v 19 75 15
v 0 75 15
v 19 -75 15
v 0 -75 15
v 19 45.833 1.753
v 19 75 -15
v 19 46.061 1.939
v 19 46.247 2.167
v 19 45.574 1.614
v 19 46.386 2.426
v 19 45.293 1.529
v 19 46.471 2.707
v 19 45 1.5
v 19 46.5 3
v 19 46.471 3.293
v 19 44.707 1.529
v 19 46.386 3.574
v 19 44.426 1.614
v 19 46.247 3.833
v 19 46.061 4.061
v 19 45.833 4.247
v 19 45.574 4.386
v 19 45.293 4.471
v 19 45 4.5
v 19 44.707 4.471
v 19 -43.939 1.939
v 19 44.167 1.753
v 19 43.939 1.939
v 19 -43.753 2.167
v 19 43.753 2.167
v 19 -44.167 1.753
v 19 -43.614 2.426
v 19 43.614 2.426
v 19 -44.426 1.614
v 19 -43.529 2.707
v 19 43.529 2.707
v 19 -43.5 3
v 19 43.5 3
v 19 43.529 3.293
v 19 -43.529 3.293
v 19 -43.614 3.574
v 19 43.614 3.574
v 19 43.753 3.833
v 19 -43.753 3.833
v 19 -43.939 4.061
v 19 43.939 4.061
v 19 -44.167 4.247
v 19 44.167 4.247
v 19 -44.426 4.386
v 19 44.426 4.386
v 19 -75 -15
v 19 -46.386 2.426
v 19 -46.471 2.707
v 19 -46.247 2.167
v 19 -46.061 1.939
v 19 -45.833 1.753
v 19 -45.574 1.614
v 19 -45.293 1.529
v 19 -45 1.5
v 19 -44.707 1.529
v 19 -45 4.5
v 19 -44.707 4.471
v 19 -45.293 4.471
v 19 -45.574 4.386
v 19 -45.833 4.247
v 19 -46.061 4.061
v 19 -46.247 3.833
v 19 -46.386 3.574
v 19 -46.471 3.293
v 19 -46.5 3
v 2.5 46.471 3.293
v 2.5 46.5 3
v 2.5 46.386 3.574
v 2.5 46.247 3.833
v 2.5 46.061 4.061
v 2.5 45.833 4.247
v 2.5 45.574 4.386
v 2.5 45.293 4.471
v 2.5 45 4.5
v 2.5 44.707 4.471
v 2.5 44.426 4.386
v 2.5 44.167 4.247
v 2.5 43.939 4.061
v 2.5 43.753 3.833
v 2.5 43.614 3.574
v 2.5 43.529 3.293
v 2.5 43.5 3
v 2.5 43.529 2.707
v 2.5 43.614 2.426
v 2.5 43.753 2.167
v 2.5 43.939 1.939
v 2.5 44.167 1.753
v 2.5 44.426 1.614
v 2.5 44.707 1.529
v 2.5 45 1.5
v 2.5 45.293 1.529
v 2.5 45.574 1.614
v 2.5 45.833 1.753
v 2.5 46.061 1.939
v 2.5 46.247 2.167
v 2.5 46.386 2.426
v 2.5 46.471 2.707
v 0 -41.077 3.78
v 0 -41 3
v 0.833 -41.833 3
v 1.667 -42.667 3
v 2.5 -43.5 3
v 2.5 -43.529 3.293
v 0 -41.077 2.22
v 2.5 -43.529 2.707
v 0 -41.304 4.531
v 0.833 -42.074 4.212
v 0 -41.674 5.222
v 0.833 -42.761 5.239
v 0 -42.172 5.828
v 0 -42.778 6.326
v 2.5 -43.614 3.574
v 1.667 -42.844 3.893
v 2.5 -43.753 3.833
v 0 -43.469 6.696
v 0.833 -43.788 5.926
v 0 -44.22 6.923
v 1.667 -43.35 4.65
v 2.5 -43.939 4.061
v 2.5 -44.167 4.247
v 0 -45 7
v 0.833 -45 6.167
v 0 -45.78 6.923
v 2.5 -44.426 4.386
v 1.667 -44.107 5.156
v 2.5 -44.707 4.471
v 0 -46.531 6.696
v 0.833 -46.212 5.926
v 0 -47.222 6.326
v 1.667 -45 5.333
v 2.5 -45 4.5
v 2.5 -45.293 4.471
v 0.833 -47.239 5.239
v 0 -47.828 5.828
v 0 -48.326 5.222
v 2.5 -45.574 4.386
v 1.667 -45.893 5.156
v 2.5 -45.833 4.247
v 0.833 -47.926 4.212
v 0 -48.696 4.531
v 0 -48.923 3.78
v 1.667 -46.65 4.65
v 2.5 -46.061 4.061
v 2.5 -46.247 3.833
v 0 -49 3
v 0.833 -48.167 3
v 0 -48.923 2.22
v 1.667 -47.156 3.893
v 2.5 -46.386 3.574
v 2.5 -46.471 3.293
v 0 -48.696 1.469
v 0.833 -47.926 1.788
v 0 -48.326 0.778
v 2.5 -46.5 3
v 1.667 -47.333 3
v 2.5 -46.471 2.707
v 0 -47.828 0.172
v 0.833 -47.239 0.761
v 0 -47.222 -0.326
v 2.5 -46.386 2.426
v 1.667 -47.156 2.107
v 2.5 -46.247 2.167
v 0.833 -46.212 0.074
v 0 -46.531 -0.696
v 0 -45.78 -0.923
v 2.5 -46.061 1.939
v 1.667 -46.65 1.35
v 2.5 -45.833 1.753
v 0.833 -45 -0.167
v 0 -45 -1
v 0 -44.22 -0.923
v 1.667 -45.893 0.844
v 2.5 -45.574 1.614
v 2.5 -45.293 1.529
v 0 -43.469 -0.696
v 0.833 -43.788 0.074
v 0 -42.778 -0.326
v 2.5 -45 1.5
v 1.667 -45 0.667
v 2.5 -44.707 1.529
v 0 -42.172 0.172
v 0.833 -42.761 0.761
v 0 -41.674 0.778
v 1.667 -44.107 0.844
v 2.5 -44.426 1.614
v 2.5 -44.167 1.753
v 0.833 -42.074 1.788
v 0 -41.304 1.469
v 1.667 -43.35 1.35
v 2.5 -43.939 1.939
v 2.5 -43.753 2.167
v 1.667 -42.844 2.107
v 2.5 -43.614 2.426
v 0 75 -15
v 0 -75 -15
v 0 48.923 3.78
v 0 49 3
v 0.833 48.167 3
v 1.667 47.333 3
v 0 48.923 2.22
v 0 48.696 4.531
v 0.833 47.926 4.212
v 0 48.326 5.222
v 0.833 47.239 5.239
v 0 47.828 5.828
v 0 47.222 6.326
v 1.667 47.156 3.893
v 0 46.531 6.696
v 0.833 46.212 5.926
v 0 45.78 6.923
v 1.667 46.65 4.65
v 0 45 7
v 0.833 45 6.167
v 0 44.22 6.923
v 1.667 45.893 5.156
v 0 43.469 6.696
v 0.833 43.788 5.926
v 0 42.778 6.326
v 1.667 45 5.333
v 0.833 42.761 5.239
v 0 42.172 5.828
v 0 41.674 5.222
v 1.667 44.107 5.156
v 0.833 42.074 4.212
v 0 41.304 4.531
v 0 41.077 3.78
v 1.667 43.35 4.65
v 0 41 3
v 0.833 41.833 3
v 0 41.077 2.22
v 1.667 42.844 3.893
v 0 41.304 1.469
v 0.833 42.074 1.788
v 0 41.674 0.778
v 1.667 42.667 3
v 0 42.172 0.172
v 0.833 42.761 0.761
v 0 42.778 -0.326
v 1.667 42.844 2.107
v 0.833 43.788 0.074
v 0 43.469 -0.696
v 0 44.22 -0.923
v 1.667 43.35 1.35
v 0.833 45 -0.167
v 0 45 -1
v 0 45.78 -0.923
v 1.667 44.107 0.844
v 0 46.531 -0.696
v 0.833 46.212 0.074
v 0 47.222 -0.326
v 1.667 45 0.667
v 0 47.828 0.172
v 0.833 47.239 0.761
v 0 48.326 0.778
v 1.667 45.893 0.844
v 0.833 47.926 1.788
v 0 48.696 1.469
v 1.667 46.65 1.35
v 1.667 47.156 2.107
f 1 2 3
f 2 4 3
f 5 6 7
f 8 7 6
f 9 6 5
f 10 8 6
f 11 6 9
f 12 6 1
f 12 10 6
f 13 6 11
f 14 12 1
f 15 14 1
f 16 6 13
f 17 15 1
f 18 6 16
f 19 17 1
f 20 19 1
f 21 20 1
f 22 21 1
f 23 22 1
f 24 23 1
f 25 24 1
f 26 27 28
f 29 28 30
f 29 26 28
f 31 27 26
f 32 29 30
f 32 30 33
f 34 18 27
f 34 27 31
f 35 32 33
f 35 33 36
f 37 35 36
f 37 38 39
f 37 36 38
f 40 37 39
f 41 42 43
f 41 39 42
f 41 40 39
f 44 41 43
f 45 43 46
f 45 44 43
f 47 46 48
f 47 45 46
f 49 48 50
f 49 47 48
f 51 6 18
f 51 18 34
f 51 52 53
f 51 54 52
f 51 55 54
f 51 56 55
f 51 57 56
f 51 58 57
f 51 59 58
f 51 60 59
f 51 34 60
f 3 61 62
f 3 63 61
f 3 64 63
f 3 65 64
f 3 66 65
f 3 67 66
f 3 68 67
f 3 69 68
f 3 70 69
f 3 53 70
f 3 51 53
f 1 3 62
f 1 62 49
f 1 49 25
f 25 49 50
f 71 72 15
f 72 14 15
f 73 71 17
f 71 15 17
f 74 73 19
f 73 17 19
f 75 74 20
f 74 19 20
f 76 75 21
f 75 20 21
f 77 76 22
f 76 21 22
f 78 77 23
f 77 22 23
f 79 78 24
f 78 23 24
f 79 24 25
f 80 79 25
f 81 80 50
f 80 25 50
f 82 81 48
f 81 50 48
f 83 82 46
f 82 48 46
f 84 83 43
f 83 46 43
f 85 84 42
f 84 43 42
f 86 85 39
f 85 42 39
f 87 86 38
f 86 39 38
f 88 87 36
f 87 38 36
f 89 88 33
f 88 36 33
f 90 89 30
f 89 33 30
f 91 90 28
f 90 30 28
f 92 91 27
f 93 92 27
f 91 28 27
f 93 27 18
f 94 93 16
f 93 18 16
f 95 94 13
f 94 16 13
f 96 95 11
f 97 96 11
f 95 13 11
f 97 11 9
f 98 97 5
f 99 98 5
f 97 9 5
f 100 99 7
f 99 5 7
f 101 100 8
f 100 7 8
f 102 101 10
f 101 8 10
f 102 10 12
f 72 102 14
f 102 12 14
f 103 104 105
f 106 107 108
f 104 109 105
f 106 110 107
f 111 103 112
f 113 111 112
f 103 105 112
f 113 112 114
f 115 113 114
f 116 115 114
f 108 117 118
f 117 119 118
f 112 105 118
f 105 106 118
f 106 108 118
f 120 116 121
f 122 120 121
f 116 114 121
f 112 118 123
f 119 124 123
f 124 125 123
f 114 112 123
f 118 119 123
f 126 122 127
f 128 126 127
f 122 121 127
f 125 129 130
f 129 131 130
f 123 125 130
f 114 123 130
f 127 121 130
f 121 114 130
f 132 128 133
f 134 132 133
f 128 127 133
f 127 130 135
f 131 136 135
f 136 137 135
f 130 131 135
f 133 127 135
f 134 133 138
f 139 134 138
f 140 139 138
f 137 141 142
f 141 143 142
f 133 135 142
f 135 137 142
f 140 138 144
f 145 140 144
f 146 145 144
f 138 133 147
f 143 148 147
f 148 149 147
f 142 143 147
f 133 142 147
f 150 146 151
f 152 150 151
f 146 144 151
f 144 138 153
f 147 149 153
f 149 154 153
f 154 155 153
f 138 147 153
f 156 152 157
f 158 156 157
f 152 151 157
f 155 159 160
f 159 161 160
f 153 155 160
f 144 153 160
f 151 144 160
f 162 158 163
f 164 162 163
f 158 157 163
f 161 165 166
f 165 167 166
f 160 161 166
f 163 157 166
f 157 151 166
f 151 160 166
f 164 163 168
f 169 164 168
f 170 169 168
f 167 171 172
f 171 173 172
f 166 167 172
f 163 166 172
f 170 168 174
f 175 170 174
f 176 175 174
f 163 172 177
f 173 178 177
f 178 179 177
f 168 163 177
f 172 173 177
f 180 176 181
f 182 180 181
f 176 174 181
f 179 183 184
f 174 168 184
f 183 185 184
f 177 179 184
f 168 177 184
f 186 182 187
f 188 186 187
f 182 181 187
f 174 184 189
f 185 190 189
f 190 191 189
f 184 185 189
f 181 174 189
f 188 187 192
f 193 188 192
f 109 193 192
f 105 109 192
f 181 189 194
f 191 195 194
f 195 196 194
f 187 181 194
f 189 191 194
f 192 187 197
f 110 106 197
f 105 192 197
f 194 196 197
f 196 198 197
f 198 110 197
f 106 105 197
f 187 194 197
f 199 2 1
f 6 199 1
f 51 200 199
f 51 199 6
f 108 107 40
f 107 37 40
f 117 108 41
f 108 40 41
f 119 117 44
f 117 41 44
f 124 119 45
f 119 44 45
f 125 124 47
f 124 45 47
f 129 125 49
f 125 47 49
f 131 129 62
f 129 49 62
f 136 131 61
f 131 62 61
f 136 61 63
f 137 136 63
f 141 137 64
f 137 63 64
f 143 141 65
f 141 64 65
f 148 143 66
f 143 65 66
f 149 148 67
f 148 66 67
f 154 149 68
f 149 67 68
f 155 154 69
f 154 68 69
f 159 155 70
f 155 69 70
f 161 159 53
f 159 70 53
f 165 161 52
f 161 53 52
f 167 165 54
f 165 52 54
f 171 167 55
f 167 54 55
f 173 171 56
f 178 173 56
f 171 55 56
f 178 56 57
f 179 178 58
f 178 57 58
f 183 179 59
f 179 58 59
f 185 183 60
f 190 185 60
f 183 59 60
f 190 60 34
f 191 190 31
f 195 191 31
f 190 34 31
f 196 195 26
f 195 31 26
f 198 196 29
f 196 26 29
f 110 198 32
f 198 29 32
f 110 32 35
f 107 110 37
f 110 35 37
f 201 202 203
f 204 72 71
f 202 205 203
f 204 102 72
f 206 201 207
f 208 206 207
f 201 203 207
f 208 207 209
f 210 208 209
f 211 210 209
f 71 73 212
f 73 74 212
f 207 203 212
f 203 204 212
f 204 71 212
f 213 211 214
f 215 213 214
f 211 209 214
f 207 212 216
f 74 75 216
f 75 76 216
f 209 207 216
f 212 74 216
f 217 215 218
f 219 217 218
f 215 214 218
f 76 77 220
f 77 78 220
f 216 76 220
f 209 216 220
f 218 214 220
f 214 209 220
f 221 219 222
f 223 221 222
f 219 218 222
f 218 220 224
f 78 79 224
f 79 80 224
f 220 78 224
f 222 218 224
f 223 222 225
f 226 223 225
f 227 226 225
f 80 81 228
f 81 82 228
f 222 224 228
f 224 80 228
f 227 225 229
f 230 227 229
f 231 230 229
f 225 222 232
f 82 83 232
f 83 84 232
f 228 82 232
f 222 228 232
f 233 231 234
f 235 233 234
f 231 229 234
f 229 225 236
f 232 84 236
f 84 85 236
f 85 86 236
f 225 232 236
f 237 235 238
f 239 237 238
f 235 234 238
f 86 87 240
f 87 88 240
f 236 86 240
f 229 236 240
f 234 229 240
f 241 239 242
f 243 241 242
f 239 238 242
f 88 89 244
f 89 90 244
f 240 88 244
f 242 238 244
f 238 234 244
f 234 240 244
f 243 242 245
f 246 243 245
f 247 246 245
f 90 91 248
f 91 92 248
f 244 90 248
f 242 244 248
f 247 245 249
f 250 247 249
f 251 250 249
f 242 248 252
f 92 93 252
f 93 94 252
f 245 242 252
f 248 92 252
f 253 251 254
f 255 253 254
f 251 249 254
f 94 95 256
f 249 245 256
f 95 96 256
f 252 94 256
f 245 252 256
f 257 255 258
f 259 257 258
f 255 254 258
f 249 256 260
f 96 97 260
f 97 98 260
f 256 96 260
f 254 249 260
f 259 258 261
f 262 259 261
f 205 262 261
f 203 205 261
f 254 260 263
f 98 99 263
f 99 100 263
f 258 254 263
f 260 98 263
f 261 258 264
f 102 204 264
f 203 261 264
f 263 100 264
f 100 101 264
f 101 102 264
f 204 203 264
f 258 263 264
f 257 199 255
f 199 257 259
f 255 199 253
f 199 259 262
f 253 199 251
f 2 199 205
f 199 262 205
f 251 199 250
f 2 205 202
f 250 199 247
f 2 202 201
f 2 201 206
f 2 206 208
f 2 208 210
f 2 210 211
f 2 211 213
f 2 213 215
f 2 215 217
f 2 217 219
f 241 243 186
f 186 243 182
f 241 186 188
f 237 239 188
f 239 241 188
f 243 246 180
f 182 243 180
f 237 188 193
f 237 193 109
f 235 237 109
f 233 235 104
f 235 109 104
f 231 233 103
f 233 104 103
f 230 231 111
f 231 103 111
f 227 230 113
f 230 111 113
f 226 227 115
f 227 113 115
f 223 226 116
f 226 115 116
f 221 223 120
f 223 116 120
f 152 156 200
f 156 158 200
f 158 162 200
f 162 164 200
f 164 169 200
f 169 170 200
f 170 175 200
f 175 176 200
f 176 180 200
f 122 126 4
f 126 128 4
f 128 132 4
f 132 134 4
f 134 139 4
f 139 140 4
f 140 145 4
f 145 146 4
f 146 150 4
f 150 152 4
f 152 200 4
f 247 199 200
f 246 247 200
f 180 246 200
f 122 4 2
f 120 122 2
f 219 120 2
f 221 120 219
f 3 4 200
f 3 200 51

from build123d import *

# Parameters (mm, degrees)
F2_W           = 19
F2_H           = 30
F3_DEPTH       = 75
F5_D           = 3
F5_CSINK_D     = 8
F5_CSINK_ANGLE = 90


with BuildPart() as f3:
    # F2 (on Front) → F3 (new body, symmetric)
    with BuildSketch(Plane.XZ):
        with Locations((9.5, 0)):
            Rectangle(F2_W, F2_H)
    extrude(amount=F3_DEPTH, both=True)

    # F5 (through all)
    with Locations(Plane(origin=(0, 0, 0), x_dir=(0, -1, 0), z_dir=(-1, 0, 0))):
        with Locations((-45, 3), (45, 3)):
            CounterSinkHole(F5_D / 2, F5_CSINK_D / 2, counter_sink_angle=F5_CSINK_ANGLE)


solid = f3.part
